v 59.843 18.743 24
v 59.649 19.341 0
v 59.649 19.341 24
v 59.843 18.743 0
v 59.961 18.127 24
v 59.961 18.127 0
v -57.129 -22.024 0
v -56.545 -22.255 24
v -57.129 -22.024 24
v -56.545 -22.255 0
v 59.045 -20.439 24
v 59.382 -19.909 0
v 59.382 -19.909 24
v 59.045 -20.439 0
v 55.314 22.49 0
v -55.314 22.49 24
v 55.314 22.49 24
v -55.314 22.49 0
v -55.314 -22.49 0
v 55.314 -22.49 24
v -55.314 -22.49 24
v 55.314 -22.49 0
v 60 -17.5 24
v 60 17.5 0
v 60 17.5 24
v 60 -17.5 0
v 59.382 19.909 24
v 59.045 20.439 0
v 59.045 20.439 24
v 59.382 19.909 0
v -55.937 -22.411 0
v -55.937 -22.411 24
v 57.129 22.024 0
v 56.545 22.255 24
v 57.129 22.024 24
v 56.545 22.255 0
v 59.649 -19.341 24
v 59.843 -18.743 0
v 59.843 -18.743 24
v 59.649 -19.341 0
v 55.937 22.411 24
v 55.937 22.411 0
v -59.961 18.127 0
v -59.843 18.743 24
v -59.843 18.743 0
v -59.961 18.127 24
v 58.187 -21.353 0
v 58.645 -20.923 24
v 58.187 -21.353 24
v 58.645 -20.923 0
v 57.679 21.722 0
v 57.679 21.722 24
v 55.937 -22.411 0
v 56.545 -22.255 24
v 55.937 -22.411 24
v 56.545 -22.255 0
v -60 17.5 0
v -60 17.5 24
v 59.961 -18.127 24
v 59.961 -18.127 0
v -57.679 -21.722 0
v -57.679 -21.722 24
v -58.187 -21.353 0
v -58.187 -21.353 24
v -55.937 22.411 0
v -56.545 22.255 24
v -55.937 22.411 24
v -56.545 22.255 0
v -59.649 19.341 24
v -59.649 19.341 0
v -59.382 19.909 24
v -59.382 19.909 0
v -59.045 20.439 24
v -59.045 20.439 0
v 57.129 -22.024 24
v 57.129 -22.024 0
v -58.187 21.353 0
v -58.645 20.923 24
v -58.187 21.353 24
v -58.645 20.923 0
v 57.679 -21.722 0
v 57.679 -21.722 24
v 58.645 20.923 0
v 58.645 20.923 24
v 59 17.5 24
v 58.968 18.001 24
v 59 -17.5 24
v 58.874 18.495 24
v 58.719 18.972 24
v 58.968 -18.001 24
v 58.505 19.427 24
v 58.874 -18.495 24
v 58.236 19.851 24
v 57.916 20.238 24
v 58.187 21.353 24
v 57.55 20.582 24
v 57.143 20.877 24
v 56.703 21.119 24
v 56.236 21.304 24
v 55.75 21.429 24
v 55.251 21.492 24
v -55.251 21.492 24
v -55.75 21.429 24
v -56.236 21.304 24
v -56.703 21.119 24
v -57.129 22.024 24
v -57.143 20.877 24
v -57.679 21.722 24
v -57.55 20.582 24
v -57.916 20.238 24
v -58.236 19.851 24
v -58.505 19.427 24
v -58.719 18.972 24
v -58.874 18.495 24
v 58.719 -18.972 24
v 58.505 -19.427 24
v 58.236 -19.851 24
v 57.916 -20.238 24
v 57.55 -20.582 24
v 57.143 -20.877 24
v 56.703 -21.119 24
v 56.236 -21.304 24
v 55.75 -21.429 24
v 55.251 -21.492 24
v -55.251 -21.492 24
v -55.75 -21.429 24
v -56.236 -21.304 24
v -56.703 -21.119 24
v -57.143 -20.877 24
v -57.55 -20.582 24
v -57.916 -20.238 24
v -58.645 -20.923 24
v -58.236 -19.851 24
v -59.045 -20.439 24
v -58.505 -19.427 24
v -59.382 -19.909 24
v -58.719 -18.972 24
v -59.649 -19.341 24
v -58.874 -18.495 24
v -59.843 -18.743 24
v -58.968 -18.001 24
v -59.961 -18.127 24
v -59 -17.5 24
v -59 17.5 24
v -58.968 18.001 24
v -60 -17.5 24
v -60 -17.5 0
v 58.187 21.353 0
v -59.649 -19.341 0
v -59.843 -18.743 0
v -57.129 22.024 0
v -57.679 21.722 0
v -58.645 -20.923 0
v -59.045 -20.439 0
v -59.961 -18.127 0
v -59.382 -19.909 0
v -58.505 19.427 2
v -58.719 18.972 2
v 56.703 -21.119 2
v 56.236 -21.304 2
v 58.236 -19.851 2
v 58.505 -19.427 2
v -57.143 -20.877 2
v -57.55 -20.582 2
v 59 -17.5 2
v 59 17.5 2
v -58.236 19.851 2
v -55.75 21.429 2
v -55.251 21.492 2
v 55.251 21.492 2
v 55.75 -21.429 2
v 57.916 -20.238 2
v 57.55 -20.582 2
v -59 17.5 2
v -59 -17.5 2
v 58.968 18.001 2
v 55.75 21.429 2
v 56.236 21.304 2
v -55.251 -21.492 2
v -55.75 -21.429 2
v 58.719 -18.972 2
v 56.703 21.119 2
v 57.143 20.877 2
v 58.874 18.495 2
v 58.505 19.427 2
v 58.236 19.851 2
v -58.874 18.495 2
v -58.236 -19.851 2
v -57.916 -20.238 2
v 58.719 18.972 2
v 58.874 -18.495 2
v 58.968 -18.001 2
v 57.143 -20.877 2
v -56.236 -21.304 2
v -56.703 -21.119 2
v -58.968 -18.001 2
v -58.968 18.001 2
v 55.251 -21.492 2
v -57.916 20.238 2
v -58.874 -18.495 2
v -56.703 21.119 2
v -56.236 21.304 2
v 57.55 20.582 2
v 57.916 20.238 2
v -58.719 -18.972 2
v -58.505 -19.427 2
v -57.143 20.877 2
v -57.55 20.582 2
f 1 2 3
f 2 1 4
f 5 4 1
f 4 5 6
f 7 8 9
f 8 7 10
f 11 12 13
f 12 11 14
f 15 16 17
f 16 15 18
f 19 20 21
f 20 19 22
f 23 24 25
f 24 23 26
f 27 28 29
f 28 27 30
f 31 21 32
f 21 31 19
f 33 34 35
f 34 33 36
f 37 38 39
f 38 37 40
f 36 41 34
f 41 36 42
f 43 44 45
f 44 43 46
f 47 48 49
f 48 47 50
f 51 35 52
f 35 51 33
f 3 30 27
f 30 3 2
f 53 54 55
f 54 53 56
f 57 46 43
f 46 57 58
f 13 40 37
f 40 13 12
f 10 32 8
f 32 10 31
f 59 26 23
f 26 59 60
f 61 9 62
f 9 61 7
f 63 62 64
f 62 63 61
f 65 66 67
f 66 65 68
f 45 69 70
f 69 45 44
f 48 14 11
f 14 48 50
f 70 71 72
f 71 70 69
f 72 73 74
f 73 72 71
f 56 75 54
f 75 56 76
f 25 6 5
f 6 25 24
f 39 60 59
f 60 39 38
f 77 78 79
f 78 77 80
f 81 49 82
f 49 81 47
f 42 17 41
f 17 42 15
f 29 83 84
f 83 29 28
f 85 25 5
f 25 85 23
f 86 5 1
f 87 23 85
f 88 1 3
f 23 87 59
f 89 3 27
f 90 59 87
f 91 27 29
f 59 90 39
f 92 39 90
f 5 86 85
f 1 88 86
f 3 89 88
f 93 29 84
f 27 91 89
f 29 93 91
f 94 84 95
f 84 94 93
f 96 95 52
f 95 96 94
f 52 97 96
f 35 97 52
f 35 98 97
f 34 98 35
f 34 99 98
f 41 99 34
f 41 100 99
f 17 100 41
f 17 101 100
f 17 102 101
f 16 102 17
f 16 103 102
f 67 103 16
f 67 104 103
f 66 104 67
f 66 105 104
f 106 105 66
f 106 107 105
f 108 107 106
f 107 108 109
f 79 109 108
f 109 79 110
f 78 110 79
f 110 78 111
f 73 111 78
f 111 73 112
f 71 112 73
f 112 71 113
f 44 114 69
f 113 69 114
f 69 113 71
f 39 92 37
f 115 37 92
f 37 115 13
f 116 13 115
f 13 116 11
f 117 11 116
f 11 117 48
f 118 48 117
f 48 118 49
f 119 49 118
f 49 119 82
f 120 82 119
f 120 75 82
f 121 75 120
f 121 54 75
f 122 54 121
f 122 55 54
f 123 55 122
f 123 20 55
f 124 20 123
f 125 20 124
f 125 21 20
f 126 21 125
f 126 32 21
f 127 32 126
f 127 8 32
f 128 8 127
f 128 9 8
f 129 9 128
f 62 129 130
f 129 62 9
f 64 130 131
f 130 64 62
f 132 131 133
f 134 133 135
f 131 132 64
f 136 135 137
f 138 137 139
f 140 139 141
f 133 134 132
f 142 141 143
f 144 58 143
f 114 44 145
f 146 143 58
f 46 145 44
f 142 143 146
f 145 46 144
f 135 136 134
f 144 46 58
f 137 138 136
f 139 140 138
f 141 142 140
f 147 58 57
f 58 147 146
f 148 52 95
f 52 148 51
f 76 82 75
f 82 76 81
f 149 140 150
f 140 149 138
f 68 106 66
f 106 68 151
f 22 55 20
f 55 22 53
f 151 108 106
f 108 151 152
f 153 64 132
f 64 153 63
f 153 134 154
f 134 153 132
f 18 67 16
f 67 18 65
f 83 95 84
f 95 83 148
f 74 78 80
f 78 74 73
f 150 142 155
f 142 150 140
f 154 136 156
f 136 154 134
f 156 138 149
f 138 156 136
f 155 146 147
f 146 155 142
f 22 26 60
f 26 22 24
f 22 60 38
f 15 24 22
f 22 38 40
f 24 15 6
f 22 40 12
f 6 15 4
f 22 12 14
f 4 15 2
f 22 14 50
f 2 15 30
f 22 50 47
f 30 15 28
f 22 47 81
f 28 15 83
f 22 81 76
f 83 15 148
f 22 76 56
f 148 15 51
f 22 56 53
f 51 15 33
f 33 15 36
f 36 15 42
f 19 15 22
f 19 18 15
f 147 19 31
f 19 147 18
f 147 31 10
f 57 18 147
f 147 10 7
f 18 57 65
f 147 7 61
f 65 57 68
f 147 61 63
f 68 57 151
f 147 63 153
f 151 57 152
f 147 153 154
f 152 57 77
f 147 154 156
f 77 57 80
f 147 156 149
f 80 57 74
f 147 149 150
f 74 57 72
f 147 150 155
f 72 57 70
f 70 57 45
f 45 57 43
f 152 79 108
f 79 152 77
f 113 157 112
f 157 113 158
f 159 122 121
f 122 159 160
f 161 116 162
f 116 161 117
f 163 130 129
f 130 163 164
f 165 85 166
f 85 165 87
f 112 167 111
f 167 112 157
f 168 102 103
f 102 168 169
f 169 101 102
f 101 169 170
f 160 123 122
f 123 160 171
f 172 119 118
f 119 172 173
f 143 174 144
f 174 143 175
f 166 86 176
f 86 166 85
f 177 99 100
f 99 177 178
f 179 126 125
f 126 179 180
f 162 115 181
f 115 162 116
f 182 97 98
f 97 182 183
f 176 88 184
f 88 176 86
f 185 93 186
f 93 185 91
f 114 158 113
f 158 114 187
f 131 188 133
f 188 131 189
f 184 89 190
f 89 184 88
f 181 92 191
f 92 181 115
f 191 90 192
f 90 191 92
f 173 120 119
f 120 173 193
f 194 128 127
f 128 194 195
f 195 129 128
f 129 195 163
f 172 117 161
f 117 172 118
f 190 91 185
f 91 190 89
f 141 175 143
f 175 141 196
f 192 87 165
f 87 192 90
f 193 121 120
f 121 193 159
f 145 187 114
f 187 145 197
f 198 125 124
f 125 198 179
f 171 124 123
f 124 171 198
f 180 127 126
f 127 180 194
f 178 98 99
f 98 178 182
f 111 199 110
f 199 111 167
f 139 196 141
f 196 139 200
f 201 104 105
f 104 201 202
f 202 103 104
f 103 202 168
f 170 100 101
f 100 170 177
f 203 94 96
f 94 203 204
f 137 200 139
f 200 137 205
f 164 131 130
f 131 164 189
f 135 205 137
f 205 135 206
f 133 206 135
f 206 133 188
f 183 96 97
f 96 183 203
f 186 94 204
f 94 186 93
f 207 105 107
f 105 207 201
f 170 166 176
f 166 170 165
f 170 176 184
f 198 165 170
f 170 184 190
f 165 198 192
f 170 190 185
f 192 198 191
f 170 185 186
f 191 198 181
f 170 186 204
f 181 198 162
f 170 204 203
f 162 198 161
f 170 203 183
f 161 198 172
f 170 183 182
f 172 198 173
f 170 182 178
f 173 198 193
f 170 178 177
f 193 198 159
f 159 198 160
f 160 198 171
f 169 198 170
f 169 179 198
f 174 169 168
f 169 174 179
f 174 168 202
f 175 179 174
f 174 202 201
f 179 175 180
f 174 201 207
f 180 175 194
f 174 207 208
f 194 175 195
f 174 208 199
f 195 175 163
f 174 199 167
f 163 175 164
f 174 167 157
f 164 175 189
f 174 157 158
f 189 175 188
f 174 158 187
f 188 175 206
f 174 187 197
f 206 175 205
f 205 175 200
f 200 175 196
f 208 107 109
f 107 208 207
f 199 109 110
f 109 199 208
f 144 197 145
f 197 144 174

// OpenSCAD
$fn = 50;


difference() {
	union() {
		hull() {
			translate(v = [-55.0000000000, 17.5000000000, 0]) {
				cylinder(h = 24, r = 5);
			}
			translate(v = [55.0000000000, 17.5000000000, 0]) {
				cylinder(h = 24, r = 5);
			}
			translate(v = [-55.0000000000, -17.5000000000, 0]) {
				cylinder(h = 24, r = 5);
			}
			translate(v = [55.0000000000, -17.5000000000, 0]) {
				cylinder(h = 24, r = 5);
			}
		}
	}
	union() {
		translate(v = [0, 0, 2]) {
			hull() {
				translate(v = [-55.0000000000, 17.5000000000, 0]) {
					cylinder(h = 22, r = 4);
				}
				translate(v = [55.0000000000, 17.5000000000, 0]) {
					cylinder(h = 22, r = 4);
				}
				translate(v = [-55.0000000000, -17.5000000000, 0]) {
					cylinder(h = 22, r = 4);
				}
				translate(v = [55.0000000000, -17.5000000000, 0]) {
					cylinder(h = 22, r = 4);
				}
			}
		}
	}
}
